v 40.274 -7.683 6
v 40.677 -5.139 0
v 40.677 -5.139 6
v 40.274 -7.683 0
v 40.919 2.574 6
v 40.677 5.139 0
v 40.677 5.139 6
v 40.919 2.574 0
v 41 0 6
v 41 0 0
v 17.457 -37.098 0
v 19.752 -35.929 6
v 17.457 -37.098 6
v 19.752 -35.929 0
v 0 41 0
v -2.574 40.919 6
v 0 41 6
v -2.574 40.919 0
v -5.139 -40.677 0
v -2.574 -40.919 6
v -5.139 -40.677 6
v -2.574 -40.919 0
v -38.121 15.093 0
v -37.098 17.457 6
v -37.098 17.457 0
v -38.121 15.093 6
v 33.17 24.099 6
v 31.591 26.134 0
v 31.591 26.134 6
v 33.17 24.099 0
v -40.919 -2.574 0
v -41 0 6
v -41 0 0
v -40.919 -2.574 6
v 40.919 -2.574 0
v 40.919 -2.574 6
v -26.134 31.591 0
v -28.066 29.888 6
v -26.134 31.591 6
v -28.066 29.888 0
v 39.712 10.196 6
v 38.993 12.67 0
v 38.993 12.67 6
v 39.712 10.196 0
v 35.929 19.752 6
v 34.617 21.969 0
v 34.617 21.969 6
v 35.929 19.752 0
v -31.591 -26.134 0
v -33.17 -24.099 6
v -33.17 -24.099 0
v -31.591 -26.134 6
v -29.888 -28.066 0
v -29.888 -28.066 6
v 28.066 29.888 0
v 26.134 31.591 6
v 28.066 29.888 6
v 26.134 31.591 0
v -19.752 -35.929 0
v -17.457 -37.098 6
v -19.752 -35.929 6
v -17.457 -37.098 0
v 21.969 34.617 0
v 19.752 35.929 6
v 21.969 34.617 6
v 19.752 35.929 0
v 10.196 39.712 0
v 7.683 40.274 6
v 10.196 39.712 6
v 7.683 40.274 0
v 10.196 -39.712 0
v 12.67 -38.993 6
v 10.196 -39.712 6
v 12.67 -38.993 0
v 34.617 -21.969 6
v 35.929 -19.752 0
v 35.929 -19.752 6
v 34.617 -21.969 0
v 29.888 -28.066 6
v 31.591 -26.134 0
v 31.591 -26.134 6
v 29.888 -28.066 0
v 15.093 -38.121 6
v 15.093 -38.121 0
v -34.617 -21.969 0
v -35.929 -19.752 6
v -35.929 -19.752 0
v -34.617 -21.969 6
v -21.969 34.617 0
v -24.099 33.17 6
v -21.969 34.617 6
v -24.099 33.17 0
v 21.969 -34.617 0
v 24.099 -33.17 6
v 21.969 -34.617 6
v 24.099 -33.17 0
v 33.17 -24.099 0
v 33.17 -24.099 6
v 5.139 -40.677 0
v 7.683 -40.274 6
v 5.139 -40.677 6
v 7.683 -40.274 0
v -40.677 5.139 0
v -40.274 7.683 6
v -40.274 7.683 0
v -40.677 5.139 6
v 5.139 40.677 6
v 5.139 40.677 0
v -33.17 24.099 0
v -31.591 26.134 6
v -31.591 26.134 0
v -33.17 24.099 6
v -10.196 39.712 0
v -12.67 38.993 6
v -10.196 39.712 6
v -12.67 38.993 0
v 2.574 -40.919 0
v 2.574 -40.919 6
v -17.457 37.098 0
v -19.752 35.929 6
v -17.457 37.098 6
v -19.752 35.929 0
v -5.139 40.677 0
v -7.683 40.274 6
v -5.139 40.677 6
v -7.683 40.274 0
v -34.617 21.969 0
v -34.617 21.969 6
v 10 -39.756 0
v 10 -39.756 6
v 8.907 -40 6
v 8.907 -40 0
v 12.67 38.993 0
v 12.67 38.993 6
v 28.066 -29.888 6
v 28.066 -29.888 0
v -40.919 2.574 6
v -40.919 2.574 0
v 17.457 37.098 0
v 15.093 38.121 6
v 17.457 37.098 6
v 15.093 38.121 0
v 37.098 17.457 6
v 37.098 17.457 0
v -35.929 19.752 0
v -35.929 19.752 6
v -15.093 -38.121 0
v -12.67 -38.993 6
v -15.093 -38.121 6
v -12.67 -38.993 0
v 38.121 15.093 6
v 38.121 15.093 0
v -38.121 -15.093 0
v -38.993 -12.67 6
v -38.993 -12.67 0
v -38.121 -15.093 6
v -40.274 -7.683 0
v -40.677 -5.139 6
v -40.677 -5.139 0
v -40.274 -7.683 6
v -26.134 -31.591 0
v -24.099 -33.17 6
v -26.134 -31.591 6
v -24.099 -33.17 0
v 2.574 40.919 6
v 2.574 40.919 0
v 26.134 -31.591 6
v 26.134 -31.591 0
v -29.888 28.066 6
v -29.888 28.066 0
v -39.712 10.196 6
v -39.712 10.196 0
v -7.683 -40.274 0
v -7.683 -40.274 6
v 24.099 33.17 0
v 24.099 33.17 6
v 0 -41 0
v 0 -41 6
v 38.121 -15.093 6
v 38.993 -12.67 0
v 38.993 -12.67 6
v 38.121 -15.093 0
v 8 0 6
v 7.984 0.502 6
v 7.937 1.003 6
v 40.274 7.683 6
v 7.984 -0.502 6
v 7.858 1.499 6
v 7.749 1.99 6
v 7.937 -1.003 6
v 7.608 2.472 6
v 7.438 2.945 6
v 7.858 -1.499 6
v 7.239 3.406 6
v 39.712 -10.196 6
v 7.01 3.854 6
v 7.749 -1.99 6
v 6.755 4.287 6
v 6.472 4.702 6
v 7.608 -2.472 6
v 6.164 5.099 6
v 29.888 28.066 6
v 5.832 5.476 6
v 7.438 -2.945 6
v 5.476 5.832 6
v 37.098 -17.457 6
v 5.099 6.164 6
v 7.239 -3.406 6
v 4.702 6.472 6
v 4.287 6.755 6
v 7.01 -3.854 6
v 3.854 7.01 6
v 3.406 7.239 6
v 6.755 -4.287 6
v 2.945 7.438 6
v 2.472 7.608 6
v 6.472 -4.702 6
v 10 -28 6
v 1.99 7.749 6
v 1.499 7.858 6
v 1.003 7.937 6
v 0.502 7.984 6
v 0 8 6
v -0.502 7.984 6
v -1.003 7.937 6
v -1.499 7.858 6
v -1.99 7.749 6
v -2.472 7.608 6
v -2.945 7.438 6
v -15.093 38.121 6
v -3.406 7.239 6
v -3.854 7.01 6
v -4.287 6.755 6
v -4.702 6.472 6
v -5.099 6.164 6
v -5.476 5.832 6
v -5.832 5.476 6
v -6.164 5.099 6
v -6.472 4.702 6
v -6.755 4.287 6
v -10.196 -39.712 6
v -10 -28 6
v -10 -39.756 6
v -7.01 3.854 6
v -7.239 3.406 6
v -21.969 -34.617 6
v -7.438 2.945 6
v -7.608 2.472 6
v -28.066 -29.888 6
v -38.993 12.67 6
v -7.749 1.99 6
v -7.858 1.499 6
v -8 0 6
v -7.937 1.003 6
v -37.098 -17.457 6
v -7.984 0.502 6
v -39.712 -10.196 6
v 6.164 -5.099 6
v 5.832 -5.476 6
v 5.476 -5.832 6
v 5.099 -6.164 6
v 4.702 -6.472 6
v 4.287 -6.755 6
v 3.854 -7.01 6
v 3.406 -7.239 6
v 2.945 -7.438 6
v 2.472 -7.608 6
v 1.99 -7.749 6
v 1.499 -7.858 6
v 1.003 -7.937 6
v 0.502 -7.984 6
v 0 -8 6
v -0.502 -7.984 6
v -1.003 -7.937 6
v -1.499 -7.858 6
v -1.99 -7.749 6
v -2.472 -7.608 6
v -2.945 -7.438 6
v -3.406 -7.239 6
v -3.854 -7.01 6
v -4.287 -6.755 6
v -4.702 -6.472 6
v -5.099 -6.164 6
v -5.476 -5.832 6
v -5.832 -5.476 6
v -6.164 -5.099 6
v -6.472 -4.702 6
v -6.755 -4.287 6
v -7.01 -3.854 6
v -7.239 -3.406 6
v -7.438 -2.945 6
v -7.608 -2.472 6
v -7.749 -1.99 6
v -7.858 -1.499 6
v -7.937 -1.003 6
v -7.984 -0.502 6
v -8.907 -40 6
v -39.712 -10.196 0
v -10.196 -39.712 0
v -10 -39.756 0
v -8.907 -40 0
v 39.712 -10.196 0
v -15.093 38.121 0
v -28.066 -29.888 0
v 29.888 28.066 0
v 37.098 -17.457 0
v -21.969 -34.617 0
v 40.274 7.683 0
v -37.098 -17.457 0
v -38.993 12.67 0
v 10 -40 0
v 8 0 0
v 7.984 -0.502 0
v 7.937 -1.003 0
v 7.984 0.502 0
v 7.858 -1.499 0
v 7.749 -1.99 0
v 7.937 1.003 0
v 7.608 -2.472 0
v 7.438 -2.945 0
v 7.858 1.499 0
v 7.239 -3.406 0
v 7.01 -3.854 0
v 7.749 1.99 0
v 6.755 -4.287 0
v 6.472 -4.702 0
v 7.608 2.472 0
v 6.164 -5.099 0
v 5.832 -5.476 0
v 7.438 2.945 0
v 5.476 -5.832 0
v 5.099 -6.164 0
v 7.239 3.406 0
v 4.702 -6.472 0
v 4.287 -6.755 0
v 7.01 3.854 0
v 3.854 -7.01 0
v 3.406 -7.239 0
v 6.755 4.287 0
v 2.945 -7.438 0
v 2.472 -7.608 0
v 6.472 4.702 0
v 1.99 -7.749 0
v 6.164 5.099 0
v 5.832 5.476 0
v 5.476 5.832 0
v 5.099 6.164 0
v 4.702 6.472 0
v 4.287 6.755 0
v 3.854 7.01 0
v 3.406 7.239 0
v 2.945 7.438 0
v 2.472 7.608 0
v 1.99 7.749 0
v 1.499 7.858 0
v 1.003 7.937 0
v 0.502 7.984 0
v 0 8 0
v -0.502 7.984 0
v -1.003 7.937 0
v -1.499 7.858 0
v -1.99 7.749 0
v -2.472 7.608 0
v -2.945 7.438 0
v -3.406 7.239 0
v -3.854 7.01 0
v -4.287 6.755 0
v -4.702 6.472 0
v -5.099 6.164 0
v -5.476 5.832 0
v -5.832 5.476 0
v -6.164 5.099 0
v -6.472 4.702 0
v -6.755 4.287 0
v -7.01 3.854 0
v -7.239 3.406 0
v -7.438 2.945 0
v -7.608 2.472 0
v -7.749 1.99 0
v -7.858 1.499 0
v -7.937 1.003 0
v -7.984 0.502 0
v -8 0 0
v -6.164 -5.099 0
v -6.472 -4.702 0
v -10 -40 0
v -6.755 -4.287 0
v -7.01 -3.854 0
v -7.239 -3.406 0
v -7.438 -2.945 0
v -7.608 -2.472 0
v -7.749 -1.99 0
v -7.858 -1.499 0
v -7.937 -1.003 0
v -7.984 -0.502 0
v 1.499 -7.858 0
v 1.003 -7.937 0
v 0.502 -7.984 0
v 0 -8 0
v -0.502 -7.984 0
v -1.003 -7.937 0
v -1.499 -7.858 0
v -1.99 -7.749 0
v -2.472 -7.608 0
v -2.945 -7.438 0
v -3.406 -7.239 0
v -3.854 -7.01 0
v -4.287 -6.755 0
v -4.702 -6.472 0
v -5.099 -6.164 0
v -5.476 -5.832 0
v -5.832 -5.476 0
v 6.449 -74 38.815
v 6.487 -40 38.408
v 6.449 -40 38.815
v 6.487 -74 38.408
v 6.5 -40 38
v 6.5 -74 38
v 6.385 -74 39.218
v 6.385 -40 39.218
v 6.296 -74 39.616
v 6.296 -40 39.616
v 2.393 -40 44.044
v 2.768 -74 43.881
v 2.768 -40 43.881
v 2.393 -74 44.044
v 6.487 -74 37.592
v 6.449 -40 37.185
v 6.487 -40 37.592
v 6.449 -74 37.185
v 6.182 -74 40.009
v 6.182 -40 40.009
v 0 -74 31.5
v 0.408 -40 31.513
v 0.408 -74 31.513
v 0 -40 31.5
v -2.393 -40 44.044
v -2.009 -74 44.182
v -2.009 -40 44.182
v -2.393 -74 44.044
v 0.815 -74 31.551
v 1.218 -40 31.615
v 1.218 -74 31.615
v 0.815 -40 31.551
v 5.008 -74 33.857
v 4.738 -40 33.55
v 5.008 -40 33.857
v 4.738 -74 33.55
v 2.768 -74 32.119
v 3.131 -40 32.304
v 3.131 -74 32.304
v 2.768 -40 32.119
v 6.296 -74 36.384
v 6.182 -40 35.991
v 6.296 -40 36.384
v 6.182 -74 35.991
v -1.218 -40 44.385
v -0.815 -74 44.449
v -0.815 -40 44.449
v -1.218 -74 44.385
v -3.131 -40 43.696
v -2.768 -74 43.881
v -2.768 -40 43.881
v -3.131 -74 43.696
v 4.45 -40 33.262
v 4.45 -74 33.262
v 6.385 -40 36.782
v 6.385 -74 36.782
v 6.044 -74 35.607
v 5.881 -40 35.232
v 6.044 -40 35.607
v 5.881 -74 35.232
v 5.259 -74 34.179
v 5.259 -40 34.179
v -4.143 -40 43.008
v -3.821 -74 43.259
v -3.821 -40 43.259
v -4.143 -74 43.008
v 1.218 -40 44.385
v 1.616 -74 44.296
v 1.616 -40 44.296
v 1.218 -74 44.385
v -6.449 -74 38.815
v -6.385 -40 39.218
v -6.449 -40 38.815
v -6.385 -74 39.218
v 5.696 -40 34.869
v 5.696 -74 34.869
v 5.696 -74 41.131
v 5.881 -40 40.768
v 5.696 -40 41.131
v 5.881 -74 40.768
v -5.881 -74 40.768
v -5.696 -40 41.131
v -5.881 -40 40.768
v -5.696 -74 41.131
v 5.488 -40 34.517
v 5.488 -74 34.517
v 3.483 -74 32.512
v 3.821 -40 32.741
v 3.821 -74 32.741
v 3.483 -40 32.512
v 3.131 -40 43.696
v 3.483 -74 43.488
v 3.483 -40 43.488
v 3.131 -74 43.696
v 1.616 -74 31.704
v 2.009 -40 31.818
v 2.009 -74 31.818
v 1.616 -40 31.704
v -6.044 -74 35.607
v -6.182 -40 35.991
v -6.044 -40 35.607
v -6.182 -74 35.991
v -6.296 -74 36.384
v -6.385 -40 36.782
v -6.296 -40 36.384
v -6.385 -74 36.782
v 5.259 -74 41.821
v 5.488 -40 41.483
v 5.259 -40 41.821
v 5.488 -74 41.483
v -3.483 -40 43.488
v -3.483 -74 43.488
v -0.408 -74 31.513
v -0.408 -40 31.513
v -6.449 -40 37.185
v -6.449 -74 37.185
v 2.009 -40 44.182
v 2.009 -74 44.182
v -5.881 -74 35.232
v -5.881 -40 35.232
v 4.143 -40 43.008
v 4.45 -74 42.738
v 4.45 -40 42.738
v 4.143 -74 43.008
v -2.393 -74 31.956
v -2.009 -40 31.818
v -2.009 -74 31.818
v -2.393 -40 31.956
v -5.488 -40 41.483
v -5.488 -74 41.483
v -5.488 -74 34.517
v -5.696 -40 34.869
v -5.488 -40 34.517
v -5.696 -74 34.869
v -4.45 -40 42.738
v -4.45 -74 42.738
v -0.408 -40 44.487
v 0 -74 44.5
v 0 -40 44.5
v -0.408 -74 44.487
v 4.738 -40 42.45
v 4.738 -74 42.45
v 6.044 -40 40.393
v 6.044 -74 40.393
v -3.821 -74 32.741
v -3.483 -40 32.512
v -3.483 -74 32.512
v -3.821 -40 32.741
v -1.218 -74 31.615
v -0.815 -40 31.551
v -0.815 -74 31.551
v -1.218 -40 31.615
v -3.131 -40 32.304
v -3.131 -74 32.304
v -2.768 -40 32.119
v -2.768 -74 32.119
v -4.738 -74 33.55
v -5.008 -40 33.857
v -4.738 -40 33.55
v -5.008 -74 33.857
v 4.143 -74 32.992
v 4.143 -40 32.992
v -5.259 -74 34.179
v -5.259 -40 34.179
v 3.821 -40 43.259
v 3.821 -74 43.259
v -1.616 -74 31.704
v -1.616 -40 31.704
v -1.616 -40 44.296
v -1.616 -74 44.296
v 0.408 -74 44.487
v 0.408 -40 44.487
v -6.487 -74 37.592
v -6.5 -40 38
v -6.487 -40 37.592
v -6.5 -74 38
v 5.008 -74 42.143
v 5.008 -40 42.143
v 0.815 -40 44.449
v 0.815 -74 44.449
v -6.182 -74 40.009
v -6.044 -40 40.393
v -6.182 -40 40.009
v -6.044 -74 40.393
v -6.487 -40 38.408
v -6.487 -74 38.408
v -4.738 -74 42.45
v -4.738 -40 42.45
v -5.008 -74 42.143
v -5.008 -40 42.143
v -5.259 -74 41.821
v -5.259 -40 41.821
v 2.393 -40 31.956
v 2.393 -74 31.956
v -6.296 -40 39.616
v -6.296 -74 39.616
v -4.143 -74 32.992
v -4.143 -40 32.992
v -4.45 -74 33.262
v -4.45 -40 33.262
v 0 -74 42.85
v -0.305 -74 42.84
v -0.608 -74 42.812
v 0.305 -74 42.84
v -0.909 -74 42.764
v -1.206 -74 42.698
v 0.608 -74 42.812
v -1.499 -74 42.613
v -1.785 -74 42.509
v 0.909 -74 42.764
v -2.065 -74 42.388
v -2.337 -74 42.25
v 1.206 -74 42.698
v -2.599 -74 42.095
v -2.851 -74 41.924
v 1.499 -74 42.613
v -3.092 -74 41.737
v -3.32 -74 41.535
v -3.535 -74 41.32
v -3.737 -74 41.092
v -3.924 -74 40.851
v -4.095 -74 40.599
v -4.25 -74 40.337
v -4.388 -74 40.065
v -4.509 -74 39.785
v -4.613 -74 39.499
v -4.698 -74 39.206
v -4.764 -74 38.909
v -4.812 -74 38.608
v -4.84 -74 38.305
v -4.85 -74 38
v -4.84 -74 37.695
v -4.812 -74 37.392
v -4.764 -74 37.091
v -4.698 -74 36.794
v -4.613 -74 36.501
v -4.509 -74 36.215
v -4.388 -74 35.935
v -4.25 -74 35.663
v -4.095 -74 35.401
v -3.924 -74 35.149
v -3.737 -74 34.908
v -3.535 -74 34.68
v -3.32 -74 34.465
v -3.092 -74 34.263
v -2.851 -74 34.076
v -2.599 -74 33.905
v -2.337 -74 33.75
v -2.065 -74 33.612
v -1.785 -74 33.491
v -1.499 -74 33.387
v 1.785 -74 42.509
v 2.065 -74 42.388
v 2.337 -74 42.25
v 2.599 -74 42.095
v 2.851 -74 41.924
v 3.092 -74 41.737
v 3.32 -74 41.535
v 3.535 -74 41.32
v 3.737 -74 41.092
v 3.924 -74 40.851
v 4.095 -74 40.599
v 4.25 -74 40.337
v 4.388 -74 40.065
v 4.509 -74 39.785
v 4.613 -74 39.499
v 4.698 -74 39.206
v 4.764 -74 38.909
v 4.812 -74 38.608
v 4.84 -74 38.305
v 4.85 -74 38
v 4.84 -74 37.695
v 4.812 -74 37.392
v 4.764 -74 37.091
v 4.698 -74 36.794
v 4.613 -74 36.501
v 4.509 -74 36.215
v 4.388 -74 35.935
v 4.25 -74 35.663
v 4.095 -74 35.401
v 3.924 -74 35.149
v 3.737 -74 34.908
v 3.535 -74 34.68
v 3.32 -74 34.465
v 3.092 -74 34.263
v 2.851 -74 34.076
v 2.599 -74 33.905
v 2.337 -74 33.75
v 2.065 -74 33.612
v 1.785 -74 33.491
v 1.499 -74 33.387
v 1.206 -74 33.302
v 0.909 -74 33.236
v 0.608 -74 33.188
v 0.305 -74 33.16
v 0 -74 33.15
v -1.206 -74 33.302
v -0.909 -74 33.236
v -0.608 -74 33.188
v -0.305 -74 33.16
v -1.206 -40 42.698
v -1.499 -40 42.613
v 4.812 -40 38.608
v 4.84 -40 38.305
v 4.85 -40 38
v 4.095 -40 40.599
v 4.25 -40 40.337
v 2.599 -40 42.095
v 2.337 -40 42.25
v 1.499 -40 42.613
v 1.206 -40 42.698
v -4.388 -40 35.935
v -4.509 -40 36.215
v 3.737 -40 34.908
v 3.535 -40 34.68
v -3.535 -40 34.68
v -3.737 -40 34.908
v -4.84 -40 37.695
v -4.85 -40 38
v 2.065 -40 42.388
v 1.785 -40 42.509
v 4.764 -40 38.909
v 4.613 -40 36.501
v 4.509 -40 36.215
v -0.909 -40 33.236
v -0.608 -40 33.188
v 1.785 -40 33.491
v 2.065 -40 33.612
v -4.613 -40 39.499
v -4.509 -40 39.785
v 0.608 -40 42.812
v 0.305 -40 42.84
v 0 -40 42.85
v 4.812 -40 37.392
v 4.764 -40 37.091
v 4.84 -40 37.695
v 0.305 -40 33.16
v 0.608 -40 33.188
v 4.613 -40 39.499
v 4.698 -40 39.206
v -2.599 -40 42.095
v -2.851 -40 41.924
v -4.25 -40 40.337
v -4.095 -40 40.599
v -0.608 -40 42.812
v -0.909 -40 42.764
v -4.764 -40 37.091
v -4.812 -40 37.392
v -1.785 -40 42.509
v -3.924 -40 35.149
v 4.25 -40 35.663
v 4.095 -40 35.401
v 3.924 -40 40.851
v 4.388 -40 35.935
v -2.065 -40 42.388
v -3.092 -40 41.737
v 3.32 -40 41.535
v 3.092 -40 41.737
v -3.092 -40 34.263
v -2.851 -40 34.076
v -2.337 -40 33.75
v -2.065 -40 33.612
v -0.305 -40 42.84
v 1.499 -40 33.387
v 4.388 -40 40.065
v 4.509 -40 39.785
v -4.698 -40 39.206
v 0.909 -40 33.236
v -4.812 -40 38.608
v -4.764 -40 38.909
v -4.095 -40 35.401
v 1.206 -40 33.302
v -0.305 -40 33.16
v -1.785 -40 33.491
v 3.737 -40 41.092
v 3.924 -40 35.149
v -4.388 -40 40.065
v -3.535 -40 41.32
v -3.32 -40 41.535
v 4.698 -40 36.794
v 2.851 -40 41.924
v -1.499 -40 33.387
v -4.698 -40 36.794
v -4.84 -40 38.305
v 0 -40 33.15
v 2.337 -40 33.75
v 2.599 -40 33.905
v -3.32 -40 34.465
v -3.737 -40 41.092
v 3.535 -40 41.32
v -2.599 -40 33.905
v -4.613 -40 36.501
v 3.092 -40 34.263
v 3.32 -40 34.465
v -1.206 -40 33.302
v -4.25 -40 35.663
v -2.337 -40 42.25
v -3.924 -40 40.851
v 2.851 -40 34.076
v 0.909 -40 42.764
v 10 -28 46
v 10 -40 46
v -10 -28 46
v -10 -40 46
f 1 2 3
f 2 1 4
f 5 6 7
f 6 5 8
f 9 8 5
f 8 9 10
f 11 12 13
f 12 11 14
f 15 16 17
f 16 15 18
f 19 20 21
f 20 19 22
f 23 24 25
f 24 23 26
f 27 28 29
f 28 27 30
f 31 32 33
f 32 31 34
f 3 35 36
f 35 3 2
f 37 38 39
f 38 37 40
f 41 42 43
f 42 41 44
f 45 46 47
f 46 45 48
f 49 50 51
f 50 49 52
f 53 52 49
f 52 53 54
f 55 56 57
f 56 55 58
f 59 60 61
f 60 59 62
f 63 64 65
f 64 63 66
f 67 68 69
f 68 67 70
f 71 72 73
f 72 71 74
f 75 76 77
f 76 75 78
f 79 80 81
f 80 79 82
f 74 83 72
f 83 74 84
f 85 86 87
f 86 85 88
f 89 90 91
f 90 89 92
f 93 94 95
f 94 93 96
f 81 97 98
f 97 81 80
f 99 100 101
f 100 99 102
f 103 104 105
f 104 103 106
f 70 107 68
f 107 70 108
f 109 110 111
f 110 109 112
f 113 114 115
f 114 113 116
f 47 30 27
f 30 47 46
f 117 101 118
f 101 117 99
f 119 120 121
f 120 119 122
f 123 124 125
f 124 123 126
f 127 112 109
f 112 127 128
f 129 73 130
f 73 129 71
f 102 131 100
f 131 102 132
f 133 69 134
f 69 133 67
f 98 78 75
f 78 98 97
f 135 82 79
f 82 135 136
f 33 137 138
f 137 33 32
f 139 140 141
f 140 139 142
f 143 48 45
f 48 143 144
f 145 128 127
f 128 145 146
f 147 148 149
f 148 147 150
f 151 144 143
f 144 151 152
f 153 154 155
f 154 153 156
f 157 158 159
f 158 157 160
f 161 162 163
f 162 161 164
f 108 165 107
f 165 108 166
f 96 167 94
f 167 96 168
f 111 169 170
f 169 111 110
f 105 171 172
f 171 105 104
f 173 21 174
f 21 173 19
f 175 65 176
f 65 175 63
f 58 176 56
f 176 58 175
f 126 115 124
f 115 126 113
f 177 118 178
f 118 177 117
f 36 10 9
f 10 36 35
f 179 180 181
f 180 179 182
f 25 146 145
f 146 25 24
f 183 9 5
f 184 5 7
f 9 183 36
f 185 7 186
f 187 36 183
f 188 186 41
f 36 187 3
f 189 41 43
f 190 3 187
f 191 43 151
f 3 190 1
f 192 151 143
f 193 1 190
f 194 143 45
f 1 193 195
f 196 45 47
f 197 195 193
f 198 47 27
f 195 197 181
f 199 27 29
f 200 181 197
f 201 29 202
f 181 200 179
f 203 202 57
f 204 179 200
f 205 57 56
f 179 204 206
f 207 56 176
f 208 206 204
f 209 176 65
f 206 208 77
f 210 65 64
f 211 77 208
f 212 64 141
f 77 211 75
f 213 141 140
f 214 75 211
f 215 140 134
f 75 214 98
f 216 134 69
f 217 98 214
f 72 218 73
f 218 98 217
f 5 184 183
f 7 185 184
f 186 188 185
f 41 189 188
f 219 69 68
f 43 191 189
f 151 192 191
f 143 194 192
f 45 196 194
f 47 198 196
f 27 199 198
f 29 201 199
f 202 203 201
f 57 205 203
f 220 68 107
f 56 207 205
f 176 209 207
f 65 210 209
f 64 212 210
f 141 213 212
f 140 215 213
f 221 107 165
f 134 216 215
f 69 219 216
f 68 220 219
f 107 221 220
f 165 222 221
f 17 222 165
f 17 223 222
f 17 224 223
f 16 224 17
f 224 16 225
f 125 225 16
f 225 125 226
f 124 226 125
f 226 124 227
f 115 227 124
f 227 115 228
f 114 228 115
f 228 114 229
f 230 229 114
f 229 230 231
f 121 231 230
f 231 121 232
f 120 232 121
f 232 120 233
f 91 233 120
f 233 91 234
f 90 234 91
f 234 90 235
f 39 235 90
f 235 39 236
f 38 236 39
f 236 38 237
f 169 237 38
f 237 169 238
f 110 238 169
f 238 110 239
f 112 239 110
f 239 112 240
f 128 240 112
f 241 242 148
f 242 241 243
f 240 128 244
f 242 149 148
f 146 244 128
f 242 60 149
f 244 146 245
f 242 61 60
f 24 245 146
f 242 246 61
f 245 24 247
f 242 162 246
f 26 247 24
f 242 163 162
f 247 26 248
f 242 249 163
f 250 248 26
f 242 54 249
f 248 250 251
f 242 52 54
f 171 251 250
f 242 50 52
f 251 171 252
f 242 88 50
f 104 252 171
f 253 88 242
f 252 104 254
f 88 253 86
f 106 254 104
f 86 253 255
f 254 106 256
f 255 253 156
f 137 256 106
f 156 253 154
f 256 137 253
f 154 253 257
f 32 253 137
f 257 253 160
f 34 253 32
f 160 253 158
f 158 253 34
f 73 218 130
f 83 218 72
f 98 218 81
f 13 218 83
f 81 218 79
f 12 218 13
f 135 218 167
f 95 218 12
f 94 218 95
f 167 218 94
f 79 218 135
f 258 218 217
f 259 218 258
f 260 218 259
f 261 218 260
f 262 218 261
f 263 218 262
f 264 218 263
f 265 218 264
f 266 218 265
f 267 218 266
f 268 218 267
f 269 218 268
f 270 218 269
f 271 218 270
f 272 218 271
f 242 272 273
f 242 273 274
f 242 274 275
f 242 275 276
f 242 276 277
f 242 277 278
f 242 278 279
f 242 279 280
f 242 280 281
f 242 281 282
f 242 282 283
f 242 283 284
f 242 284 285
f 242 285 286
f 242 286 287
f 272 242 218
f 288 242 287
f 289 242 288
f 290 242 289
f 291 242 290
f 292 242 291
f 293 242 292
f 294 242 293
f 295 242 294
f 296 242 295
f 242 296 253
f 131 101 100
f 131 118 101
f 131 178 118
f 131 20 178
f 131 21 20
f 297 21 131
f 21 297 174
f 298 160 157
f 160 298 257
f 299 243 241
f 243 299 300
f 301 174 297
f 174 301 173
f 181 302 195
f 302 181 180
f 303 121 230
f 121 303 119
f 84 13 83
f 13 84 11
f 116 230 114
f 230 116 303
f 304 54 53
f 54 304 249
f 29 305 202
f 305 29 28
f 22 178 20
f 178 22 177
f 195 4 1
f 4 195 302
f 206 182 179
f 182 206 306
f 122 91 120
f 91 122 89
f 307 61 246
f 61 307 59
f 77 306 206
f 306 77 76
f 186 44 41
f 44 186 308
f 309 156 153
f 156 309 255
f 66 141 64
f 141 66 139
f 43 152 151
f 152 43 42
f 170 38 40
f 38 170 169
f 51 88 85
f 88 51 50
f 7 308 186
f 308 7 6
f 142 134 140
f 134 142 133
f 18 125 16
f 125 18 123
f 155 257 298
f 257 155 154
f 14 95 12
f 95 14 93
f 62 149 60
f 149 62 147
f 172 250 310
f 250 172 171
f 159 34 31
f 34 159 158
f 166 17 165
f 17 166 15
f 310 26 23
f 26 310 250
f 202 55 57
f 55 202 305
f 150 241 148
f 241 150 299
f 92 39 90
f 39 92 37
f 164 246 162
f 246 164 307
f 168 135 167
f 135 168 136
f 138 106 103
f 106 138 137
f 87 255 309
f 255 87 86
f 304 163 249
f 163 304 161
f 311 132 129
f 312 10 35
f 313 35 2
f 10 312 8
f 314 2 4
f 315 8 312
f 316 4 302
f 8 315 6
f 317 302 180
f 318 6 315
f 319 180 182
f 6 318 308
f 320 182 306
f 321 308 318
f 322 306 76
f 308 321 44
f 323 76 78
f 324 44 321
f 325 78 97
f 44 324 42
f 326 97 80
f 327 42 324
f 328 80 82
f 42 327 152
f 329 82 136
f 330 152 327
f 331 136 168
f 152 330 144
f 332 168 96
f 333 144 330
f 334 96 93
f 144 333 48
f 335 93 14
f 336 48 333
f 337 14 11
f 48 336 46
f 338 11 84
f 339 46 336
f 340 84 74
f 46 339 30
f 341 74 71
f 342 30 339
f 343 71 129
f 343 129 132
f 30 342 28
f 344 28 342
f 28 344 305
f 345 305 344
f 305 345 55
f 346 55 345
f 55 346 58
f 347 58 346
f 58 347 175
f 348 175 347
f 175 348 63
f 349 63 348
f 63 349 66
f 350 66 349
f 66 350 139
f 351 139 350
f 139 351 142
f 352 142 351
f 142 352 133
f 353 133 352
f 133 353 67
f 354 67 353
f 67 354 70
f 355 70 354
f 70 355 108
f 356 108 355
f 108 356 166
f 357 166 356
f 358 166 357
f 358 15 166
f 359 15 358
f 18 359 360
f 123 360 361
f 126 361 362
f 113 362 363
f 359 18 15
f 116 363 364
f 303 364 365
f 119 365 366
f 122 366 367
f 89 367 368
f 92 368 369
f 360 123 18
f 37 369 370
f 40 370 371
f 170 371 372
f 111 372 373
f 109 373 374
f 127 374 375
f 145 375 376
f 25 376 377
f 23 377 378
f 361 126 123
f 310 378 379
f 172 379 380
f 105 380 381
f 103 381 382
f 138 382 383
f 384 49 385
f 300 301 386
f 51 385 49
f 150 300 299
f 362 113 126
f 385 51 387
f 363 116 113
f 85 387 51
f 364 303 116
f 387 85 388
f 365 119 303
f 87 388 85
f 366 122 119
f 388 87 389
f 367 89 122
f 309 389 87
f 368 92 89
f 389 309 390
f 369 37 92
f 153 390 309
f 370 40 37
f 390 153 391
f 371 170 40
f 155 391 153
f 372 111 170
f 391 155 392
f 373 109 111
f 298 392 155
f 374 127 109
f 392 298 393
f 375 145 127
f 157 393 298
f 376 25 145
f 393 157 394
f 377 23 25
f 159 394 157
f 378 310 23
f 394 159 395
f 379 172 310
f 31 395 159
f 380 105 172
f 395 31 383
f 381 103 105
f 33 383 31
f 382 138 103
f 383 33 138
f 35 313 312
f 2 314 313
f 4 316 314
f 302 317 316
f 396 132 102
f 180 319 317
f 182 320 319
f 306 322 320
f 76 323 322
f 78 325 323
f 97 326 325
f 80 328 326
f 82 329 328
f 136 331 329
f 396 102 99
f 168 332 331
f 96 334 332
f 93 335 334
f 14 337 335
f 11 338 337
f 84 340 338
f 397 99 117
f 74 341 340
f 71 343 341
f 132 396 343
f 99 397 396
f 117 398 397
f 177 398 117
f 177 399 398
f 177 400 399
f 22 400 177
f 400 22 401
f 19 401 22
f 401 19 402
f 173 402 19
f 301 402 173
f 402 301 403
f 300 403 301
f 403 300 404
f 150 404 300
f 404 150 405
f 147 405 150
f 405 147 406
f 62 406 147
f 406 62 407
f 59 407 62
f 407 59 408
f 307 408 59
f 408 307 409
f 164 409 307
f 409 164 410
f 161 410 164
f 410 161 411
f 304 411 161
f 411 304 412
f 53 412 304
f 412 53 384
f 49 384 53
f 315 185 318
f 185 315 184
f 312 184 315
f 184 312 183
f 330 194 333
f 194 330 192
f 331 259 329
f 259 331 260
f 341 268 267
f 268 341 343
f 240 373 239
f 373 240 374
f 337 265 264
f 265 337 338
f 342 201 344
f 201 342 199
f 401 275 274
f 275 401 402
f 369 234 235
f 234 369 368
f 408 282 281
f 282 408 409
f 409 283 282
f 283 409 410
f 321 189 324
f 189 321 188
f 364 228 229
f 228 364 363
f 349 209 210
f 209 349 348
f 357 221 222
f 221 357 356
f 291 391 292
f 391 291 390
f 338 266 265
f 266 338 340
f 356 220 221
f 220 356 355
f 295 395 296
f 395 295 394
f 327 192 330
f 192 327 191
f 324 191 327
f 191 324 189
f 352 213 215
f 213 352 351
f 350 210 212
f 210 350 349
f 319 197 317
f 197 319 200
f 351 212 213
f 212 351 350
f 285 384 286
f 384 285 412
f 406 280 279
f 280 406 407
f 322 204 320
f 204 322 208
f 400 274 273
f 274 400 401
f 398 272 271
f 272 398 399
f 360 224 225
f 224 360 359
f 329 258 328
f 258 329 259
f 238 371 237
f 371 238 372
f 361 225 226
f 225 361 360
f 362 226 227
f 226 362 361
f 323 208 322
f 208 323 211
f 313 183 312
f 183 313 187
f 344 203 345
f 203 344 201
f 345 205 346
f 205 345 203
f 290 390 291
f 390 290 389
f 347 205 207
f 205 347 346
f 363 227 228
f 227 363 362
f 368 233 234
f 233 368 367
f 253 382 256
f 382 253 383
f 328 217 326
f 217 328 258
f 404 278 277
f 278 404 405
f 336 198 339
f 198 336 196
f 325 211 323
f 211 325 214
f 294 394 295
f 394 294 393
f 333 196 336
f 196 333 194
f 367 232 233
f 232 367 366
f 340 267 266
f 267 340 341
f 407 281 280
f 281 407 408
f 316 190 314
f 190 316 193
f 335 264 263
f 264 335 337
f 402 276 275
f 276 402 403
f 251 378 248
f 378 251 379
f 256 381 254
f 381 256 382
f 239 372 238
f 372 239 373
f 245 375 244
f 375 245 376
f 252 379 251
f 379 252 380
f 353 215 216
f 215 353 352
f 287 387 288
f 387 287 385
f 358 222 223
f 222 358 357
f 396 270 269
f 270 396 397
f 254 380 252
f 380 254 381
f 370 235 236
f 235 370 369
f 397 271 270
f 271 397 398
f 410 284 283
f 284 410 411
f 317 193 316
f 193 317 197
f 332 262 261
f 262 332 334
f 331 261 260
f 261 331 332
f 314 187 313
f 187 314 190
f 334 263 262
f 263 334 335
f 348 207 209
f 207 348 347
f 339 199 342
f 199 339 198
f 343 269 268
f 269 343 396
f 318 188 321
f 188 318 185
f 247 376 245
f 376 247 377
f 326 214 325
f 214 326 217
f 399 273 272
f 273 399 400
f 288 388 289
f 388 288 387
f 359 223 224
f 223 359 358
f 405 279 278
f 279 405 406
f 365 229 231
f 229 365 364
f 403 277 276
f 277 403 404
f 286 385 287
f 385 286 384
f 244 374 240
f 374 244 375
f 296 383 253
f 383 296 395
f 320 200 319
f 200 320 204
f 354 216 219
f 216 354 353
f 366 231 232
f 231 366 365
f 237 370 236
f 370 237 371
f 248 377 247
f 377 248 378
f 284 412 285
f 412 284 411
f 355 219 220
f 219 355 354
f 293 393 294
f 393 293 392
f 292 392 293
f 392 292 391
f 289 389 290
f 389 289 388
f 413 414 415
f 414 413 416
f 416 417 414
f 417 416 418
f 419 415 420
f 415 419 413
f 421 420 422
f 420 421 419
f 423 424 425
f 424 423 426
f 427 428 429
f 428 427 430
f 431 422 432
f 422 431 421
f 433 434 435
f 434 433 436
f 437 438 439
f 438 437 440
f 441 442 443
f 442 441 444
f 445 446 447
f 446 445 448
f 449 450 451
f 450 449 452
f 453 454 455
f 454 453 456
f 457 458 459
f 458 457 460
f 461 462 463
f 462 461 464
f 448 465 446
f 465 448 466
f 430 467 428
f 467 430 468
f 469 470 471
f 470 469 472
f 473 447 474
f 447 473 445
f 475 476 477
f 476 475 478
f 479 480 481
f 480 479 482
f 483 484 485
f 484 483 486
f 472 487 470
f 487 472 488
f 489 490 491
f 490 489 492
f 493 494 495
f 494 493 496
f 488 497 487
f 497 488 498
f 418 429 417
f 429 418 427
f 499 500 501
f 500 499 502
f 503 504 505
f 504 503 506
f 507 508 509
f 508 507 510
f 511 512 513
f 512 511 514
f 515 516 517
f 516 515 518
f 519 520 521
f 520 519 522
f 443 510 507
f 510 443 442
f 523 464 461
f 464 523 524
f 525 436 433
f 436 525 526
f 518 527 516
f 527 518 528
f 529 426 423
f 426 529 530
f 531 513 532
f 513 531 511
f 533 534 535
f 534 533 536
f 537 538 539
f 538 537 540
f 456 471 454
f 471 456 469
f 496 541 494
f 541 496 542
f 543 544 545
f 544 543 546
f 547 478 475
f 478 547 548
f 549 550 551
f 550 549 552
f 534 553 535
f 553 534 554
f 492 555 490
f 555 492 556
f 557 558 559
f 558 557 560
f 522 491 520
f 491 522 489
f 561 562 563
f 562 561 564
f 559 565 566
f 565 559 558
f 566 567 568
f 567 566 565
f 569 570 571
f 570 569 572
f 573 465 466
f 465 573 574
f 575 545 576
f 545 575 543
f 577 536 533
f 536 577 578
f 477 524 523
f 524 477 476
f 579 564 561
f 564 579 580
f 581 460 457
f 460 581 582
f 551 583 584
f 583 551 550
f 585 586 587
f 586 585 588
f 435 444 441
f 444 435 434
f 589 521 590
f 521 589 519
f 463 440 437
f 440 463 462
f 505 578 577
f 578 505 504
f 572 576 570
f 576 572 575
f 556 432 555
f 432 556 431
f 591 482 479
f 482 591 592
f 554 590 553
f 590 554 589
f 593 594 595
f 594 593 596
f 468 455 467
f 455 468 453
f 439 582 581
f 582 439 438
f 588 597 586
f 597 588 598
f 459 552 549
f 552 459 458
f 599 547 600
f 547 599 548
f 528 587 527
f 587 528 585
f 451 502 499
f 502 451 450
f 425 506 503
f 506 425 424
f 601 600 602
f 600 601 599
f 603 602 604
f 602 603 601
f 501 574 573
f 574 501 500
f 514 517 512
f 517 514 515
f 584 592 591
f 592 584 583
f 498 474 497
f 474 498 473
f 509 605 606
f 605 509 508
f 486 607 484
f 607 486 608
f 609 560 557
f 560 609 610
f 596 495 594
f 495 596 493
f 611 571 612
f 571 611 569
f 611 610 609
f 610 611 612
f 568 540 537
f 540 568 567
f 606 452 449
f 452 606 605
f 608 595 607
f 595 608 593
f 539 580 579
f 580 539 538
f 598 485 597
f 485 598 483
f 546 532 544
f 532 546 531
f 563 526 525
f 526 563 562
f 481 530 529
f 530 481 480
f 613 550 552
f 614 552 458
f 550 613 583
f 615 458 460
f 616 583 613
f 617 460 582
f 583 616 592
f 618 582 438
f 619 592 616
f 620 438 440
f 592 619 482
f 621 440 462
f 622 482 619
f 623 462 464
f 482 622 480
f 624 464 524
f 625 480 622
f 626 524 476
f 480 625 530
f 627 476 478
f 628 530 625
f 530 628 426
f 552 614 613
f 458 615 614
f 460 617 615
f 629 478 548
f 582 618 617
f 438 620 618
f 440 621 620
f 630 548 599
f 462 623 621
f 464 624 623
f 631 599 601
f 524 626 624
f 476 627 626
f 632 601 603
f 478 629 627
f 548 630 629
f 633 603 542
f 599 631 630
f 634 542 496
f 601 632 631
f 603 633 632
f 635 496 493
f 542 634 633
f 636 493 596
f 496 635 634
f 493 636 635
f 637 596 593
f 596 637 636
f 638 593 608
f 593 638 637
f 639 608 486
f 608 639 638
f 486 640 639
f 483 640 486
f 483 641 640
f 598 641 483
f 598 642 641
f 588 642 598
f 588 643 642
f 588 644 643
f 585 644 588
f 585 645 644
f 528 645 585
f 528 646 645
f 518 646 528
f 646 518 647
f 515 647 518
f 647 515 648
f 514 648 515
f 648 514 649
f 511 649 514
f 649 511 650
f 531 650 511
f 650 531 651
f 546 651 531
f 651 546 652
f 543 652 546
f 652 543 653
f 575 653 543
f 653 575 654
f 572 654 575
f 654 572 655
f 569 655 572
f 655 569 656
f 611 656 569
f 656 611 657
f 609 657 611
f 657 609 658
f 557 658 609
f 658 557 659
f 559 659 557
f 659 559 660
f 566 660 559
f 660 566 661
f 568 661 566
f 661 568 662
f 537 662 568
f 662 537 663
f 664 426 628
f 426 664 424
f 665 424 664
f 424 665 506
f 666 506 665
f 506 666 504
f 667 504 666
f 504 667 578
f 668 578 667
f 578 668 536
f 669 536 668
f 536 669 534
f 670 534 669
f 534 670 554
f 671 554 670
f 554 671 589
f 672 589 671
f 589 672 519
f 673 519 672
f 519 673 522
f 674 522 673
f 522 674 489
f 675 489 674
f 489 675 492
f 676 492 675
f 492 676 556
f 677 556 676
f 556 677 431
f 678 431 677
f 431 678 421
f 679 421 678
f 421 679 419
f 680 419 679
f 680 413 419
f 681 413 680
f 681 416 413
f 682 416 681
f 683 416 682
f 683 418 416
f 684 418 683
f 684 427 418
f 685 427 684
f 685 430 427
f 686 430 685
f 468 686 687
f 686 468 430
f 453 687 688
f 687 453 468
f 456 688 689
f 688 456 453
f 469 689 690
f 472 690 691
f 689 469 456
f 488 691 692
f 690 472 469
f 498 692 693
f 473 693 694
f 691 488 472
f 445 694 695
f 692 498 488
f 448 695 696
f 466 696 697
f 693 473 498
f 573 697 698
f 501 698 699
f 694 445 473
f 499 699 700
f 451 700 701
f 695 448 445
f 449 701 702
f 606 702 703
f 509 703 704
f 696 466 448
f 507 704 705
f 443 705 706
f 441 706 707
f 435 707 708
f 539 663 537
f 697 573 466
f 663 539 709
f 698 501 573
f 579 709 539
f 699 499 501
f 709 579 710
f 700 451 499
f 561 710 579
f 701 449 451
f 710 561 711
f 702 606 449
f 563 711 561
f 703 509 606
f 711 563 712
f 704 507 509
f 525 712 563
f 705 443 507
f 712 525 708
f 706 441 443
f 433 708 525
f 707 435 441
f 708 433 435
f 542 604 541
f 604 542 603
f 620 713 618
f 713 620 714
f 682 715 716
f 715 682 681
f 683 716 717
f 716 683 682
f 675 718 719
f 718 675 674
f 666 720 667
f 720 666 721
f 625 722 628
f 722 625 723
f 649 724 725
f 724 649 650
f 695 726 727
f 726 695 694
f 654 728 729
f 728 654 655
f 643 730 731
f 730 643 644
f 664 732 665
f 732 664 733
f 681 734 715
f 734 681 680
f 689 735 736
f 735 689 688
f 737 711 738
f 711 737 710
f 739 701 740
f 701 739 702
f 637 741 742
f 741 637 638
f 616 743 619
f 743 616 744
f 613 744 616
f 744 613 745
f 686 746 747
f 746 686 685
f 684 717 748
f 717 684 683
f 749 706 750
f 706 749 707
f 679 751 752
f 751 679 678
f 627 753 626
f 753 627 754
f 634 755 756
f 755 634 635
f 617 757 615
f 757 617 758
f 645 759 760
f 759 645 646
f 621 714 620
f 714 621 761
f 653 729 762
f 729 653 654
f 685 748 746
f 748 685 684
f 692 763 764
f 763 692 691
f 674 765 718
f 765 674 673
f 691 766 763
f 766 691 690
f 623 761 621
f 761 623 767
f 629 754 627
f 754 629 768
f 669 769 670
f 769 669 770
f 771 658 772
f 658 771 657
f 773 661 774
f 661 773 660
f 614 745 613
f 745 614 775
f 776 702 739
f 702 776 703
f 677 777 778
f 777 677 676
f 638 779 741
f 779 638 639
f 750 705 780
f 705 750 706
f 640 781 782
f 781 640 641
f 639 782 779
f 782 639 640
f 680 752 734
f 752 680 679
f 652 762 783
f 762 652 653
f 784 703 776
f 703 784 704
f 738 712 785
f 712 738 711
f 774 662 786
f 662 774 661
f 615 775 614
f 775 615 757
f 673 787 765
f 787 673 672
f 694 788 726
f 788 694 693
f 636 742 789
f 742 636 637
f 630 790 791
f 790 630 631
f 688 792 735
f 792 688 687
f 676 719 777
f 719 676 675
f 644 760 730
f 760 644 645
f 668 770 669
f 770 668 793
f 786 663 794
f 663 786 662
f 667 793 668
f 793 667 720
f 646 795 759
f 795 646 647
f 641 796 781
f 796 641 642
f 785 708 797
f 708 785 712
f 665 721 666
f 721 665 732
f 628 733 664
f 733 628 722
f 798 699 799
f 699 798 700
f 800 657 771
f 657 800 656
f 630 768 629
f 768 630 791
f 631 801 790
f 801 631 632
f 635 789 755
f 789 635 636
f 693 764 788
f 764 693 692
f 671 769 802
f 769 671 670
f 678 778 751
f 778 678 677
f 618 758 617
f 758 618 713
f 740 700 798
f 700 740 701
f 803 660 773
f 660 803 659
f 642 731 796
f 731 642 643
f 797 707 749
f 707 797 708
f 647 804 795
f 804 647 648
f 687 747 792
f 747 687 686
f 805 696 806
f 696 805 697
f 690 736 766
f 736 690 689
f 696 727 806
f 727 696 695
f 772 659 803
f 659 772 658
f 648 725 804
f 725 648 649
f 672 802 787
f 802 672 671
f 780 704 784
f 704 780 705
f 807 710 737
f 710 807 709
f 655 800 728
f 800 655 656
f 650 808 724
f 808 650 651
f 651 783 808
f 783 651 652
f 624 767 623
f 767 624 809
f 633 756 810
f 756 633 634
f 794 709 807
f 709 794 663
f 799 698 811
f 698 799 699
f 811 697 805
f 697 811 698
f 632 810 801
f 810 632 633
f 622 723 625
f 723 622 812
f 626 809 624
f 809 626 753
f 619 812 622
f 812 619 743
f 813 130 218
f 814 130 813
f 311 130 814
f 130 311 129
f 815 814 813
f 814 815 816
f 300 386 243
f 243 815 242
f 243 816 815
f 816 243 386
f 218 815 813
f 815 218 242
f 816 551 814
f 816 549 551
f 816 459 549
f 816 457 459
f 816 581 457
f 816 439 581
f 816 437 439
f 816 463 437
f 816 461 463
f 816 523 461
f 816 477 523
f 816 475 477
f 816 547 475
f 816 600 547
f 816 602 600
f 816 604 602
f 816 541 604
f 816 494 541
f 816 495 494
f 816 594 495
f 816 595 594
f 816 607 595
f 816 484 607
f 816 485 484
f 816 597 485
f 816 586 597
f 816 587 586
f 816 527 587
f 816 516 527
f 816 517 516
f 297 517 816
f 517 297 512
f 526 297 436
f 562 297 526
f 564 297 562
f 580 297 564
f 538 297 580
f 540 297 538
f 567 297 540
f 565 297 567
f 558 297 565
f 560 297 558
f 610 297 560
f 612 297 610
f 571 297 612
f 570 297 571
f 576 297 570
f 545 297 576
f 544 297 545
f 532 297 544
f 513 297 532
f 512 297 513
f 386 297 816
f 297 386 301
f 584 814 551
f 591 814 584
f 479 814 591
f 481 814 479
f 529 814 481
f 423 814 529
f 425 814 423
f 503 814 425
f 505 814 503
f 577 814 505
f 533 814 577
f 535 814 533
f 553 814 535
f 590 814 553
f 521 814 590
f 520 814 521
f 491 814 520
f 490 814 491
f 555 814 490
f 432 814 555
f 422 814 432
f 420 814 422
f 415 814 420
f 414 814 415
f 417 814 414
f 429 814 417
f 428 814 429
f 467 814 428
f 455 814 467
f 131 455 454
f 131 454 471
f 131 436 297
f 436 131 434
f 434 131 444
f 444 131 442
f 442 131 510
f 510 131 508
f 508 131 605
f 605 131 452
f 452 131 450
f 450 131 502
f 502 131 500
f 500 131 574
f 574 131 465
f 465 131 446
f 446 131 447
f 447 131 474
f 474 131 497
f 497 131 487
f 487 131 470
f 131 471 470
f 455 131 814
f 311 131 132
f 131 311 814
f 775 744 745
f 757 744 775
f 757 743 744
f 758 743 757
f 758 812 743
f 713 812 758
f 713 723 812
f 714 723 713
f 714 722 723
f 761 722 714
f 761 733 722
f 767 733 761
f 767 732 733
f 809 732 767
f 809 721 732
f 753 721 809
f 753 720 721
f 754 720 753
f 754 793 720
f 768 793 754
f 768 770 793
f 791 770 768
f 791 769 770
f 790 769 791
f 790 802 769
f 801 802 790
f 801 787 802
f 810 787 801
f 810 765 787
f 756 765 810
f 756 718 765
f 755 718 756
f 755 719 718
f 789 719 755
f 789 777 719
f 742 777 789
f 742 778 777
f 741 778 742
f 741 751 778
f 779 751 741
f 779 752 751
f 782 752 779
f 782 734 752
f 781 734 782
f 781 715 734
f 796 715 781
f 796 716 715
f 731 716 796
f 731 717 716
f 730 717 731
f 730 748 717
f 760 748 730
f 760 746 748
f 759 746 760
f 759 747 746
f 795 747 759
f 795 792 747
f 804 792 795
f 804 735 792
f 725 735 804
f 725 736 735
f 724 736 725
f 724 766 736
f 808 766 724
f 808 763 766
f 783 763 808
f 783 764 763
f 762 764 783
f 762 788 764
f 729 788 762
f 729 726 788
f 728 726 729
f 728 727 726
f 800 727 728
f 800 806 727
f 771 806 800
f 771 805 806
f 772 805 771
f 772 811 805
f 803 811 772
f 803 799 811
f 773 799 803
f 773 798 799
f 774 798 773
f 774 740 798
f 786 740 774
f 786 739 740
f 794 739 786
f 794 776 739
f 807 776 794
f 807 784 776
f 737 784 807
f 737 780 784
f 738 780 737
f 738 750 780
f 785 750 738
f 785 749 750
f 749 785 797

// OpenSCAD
/*
 * Angle grinder adaptor
 * (c) 2020 David Mikulik
 * Licensed under 
 * Creative Commons 
 * Attribution Non Comercial Share alike license
 */
 
$fn=100;
union () {
    difference() 
    {
        cylinder (d=82,h=6);
        cylinder (d=16,h=6);
    }
    translate ([-10,-40,00]) {
        cube ([20,12,33+13]);
    }
    rotate([90,0,0]) { translate ([0,38,40-6]) {
        difference() 
        {
            cylinder (d=13,h=40);
            cylinder (d=9.7,h=40);
        }
    }}
}
